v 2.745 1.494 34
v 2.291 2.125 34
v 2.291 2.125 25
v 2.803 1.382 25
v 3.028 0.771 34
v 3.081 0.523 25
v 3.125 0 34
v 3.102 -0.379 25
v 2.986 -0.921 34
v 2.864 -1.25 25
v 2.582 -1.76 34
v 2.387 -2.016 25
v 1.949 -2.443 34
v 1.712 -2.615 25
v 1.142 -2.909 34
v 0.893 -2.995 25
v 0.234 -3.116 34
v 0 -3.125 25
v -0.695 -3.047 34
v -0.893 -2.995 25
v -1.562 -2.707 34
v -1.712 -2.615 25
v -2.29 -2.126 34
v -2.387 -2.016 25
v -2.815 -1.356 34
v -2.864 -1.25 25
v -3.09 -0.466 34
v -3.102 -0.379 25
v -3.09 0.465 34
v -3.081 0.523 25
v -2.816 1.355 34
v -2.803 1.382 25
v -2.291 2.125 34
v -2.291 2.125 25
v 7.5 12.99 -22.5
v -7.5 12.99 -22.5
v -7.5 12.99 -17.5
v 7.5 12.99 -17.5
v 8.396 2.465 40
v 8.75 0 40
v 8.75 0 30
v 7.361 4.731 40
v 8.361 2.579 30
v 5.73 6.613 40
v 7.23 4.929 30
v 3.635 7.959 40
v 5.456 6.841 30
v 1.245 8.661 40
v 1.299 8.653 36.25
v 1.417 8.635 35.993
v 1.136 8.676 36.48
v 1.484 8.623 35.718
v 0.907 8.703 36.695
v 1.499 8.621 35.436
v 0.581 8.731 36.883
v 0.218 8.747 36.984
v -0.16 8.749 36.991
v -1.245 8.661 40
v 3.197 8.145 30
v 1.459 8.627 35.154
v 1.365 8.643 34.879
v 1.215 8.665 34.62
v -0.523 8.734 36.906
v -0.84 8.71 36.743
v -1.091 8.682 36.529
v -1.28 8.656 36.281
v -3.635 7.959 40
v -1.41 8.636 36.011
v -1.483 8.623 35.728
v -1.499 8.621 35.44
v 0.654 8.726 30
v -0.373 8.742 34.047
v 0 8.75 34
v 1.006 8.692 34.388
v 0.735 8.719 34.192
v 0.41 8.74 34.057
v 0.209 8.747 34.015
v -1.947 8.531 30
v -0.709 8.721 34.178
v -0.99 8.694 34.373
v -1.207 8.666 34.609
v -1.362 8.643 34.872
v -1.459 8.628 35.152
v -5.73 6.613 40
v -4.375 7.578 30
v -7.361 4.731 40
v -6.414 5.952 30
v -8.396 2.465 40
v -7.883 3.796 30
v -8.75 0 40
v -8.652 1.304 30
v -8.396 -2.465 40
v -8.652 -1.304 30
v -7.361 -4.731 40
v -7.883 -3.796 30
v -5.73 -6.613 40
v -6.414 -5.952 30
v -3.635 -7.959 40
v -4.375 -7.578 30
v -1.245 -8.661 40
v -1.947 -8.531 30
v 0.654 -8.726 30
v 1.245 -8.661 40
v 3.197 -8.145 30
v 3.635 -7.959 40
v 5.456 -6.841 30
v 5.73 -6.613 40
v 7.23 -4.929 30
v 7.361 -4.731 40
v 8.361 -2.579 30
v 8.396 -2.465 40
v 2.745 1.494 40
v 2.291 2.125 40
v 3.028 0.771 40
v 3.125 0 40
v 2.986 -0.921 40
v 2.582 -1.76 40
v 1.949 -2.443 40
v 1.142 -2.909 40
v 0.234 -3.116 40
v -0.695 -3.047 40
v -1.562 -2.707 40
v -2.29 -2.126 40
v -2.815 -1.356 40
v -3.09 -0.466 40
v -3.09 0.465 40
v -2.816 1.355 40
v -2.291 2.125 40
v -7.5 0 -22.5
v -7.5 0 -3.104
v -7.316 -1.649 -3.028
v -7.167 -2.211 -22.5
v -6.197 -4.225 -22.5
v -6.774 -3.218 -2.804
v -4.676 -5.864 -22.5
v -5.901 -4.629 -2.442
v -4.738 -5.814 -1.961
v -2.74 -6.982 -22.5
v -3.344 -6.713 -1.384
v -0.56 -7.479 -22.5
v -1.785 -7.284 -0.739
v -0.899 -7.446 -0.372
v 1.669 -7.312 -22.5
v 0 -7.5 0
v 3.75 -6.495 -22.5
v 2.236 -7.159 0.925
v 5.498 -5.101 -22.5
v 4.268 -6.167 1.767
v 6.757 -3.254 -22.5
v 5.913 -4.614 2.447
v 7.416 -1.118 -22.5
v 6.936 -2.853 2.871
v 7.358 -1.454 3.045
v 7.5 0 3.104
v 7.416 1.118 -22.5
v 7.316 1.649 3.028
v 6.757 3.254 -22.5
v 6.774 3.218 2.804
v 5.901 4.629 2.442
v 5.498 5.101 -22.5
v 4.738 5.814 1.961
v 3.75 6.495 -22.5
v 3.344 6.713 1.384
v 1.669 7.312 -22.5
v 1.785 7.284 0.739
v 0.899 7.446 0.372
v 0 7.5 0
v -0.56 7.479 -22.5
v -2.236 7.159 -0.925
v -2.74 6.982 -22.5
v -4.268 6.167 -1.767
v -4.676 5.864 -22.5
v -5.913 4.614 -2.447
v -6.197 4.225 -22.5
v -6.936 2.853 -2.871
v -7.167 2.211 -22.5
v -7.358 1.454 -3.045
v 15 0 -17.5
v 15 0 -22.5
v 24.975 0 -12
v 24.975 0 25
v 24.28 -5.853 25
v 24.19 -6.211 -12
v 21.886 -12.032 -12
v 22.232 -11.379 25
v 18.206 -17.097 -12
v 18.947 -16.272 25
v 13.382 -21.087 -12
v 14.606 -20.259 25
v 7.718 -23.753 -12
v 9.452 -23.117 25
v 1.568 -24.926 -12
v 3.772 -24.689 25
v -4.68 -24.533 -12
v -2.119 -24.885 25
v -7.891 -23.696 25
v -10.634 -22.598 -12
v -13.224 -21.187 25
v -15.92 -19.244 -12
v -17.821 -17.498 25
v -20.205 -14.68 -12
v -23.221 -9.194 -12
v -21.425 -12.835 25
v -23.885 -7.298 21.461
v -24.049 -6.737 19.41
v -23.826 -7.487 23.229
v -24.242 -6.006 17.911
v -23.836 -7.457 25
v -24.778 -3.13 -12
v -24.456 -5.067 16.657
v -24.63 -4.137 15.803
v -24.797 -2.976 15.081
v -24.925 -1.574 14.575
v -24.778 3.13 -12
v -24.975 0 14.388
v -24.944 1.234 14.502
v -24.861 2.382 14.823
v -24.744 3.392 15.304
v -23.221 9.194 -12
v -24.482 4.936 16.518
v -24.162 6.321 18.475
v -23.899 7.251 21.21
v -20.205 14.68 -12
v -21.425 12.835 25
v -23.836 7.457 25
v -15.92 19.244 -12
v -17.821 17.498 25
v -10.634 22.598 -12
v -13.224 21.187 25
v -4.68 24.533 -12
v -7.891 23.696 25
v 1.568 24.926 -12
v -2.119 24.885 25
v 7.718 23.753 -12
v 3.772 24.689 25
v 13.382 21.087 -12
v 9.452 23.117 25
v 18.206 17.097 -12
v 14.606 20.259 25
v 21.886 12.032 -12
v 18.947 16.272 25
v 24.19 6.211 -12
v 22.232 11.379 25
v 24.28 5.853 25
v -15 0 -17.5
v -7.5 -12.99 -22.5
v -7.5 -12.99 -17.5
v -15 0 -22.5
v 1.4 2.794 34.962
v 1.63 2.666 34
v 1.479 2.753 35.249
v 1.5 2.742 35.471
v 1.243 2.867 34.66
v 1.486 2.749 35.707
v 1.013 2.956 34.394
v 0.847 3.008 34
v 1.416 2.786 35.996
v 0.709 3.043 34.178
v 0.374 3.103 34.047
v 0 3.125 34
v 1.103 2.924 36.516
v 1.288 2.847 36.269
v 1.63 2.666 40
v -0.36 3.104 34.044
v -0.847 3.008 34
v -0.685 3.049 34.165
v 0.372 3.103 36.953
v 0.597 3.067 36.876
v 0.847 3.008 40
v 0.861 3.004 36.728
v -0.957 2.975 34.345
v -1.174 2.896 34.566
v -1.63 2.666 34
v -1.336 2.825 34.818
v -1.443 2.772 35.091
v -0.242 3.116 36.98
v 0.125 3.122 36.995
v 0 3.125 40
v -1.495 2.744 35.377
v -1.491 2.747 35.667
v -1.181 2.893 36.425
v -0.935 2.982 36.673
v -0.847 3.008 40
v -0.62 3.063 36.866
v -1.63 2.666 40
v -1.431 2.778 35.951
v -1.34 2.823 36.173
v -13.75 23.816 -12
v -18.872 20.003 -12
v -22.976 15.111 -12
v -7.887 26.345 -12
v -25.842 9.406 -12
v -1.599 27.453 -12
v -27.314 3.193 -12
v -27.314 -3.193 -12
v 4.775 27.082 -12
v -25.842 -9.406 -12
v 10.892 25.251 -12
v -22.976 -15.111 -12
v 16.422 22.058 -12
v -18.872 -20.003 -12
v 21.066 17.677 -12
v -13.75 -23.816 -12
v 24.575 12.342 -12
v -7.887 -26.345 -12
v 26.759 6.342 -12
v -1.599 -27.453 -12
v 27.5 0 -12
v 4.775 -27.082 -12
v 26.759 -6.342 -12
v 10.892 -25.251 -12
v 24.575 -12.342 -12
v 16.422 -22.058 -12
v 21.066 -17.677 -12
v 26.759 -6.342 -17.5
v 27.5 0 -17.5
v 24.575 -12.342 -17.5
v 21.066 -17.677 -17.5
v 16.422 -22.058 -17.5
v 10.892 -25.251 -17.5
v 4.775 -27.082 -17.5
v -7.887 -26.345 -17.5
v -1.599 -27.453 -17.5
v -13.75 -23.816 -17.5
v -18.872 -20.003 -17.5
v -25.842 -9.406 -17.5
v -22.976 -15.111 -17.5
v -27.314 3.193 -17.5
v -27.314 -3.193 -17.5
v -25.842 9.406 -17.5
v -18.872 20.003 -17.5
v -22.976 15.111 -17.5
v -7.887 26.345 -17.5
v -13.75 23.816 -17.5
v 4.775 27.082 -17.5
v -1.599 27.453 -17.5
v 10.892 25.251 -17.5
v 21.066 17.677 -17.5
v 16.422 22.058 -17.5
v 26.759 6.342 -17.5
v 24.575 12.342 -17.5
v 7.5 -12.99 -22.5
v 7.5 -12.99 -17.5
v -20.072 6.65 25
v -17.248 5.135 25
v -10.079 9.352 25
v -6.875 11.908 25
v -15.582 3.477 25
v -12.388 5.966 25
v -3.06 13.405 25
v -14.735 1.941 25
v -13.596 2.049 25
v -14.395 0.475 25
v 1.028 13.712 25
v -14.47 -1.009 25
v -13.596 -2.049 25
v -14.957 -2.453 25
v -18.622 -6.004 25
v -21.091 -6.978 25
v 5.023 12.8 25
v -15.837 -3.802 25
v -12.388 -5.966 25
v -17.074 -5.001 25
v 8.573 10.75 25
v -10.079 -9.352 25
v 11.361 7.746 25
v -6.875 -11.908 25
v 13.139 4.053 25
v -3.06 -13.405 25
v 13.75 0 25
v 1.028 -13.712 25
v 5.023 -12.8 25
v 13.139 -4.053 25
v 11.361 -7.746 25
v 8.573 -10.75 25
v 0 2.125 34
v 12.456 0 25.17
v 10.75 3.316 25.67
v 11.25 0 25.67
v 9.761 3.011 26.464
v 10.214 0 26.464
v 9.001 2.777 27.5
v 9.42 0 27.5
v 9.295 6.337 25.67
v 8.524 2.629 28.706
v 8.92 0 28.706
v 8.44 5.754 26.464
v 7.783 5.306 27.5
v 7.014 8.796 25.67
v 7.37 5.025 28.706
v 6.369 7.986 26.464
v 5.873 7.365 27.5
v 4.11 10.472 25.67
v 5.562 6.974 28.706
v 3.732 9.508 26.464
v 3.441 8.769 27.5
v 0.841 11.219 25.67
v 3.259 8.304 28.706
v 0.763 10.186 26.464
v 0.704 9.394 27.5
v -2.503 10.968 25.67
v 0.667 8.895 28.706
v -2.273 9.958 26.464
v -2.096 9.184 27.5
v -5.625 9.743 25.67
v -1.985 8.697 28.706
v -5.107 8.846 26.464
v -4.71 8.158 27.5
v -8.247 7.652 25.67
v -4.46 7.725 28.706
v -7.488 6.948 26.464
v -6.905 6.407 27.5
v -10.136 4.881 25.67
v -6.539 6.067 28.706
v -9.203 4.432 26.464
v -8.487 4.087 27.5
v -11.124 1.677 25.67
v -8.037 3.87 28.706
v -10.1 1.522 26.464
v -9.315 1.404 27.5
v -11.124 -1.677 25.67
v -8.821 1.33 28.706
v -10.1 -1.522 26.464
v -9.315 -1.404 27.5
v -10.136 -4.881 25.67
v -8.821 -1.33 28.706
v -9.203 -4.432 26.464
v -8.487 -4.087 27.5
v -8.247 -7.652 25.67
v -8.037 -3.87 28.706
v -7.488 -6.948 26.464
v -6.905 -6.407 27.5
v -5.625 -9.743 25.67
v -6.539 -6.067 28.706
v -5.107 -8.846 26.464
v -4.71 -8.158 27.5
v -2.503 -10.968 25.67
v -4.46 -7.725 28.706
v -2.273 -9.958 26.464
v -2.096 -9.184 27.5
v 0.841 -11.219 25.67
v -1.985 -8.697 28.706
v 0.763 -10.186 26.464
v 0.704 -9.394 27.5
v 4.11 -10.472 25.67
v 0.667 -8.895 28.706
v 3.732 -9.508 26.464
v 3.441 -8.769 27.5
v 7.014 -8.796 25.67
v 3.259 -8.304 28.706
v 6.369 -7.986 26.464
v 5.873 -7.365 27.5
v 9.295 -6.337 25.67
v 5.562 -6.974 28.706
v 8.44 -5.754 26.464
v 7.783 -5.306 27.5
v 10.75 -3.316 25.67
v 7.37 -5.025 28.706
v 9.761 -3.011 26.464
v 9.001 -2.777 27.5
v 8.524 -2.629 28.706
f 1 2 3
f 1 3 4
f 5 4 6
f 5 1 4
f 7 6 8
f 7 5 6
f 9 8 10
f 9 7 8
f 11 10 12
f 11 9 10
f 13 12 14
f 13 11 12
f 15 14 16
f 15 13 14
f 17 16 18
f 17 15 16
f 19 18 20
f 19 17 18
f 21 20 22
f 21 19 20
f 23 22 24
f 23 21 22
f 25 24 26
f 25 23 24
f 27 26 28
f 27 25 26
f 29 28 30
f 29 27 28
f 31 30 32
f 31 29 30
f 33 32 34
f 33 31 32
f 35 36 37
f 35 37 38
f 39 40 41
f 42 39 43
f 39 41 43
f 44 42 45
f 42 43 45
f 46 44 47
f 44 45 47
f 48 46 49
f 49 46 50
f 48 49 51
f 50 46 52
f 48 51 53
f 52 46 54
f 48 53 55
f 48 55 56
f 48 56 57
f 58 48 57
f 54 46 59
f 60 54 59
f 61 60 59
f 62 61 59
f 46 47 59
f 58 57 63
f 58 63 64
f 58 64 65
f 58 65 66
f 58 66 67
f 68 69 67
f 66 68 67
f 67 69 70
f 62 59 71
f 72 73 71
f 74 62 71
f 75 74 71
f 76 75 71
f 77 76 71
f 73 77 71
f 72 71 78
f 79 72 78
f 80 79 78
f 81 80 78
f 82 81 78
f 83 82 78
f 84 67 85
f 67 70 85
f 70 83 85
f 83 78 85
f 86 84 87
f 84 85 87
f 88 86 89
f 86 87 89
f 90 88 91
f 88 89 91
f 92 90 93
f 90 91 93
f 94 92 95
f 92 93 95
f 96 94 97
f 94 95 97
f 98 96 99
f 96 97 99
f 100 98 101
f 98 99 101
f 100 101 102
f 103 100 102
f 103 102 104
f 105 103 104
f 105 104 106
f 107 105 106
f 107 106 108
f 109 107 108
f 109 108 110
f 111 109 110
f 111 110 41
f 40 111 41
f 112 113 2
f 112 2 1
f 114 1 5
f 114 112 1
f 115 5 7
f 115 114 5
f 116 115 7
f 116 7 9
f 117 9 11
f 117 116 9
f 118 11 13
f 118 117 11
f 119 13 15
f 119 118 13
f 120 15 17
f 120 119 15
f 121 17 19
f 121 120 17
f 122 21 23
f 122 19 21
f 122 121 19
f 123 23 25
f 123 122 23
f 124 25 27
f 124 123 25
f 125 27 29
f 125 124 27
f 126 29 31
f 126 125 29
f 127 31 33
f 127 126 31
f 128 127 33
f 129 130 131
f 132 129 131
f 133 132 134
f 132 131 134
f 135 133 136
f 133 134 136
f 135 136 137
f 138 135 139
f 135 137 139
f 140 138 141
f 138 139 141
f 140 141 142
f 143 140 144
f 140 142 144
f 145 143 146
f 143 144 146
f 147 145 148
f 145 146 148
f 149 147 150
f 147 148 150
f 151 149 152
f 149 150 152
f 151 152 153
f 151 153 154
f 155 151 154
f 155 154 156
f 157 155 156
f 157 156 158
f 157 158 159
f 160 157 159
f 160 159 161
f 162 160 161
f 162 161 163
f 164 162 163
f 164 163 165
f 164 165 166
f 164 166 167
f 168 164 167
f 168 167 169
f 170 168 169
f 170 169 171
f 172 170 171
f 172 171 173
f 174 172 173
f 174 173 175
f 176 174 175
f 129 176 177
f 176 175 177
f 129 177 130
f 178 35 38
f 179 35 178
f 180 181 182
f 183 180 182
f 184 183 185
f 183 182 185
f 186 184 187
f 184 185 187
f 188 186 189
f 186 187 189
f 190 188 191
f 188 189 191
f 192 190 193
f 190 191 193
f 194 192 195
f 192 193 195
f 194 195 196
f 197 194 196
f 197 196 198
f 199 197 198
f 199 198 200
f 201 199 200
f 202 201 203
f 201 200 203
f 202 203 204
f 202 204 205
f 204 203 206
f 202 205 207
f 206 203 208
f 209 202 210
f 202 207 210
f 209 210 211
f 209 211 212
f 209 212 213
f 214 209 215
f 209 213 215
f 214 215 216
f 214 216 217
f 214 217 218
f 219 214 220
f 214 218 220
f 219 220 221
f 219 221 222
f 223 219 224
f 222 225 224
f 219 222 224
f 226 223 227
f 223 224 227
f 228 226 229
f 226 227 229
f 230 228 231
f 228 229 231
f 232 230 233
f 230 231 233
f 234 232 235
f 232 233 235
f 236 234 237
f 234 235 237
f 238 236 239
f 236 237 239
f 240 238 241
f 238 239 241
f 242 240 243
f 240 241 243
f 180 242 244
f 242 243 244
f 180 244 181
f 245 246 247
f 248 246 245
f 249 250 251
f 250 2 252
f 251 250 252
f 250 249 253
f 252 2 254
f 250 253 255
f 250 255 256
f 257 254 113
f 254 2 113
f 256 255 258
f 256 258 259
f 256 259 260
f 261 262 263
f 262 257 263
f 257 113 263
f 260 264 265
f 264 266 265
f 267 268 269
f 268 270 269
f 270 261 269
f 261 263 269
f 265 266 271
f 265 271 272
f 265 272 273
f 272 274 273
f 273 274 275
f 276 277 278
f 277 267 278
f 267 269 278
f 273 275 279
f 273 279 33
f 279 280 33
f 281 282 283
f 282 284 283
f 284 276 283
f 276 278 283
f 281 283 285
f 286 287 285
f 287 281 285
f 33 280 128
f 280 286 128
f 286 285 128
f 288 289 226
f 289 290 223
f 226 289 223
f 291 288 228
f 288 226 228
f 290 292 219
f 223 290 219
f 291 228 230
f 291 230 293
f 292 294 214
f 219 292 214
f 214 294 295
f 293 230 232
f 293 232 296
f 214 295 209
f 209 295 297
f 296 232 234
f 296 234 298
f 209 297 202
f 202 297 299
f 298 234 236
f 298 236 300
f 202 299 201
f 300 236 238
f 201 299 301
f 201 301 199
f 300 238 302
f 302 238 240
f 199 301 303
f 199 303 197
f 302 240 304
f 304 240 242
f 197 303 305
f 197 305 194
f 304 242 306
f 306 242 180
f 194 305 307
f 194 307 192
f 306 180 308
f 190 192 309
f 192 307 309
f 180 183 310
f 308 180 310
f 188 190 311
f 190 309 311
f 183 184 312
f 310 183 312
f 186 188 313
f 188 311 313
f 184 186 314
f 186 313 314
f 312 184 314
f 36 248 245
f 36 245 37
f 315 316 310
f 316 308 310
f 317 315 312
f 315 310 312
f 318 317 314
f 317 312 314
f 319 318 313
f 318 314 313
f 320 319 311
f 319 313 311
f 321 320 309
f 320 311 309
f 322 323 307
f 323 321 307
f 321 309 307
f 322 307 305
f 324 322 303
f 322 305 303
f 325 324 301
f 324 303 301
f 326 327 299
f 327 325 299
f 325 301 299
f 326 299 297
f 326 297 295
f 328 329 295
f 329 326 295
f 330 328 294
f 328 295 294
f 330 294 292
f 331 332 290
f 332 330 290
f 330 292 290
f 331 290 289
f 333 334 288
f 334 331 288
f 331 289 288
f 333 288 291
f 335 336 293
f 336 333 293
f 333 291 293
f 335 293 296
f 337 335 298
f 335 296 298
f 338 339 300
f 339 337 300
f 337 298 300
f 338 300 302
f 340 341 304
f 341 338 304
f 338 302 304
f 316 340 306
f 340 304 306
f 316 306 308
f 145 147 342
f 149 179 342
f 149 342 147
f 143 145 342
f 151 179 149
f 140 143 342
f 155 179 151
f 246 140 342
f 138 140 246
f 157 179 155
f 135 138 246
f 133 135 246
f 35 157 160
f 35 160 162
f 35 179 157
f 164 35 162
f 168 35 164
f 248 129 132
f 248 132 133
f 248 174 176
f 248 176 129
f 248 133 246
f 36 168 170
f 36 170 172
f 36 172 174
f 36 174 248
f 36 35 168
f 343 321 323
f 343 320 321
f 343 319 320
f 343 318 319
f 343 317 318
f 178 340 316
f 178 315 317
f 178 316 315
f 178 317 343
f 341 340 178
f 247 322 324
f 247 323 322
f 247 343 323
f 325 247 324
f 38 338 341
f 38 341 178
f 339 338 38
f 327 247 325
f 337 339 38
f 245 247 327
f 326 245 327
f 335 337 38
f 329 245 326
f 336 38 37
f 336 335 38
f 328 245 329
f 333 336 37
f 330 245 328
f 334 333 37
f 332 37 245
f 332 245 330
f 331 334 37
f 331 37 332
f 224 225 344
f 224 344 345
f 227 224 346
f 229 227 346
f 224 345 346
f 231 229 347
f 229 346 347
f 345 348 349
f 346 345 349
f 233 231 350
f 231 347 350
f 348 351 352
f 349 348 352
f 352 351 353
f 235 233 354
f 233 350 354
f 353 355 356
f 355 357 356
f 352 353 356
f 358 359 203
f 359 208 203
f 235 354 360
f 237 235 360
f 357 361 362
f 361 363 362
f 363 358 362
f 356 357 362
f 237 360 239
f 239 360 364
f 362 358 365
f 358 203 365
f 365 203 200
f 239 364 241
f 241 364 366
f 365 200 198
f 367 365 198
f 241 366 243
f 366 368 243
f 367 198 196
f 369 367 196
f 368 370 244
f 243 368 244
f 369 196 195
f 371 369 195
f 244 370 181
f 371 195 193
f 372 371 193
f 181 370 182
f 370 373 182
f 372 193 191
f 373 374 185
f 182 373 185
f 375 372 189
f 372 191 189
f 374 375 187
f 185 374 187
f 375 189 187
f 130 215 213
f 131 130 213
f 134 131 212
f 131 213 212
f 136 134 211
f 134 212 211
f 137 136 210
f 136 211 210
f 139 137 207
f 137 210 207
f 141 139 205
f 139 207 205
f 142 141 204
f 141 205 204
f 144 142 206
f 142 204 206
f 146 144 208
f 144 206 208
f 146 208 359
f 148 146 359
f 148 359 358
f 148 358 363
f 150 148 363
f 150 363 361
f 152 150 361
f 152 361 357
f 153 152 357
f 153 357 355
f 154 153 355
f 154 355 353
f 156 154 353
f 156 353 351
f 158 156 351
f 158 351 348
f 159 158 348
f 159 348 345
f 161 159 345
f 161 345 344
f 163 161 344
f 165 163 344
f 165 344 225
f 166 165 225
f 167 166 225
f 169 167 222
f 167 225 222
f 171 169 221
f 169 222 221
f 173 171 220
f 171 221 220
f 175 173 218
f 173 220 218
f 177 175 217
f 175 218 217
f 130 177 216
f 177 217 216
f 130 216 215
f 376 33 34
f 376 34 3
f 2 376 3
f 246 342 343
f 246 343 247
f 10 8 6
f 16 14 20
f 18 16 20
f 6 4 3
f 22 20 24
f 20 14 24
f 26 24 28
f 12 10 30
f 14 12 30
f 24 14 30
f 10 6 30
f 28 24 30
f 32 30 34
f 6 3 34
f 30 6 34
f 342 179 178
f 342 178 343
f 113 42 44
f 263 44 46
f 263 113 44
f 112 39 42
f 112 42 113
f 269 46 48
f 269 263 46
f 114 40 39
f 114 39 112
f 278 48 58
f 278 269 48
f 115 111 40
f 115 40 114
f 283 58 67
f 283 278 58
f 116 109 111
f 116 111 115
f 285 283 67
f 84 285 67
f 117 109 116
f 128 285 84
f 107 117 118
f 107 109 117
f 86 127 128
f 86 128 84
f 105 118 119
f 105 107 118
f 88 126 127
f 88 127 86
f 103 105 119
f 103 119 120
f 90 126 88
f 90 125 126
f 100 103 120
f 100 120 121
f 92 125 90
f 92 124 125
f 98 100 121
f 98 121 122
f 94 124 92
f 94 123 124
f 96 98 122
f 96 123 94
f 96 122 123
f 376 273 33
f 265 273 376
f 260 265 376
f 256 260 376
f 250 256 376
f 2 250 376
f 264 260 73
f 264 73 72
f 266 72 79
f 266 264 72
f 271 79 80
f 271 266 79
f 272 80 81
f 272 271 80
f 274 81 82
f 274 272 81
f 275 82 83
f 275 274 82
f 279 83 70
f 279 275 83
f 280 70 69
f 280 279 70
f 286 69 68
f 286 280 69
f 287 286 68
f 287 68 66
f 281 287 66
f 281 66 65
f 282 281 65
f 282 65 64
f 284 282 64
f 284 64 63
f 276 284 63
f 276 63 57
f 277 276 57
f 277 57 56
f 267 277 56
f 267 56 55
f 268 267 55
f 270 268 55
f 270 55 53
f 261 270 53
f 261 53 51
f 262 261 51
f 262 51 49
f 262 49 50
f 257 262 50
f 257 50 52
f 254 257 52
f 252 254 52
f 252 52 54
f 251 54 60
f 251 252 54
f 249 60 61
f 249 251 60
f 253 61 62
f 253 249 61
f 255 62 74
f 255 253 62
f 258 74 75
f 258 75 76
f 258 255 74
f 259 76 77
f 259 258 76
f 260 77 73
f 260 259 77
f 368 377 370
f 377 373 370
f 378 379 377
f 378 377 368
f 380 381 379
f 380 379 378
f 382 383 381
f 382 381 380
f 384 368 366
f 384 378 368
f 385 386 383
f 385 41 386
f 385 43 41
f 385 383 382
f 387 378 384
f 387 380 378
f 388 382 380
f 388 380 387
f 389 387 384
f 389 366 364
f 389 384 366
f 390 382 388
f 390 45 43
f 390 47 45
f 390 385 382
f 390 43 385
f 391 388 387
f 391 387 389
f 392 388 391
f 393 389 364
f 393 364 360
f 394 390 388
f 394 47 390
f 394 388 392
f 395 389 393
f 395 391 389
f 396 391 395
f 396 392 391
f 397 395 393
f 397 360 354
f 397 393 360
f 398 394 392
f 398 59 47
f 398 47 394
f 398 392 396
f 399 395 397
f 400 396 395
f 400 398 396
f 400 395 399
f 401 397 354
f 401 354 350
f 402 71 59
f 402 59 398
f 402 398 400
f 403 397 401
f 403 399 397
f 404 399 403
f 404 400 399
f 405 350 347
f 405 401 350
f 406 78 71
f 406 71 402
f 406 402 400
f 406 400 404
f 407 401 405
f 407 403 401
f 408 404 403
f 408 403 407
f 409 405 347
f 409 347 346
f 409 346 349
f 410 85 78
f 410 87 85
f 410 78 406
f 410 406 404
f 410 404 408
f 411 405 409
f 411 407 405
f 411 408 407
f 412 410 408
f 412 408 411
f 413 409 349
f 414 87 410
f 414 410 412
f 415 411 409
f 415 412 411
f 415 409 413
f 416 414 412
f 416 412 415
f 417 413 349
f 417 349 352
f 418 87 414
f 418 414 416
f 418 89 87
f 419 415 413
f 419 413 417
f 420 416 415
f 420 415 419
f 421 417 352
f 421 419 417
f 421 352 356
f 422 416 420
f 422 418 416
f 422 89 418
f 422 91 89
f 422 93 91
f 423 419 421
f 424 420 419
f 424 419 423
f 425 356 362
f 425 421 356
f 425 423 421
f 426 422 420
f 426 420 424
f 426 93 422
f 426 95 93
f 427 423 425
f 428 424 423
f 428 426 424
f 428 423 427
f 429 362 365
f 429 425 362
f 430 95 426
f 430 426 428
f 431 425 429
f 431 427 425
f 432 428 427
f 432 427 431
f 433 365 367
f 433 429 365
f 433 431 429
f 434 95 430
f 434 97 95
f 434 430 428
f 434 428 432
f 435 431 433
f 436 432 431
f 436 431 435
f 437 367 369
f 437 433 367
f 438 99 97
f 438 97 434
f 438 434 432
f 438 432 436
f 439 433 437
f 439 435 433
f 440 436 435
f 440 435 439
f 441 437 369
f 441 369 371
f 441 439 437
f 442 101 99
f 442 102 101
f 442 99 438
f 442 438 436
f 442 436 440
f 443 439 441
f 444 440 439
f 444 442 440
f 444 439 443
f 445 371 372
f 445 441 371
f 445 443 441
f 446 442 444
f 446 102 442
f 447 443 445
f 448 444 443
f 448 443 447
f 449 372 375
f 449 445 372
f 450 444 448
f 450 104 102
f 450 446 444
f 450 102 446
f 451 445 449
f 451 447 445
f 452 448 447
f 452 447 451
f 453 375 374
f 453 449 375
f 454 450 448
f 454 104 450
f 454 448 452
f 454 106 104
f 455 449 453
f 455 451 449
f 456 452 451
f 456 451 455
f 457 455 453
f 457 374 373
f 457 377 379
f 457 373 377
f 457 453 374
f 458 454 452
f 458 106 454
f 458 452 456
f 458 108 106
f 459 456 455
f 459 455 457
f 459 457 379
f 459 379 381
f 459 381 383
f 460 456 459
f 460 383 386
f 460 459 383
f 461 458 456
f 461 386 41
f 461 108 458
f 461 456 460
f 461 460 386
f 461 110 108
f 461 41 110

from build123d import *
from build123d.topology import SkipClean

# Parameters (mm, degrees)
IZIM3_OUTSIDE_W             = 75.494
IZIM3_OUTSIDE_H             = 75.494
KES_EKSTR_ZYON1_DEPTH       = 7.5
IZIM4_R                     = 8.75
Y_KSEKLIK_EKSTR_ZYON1_DEPTH = 20
RADYUS1_R                   = 5
KES_EKSTR_ZYON2_DEPTH       = 20
IZIM6_R                     = 1.5
KES_EKSTR_ZYON3_DEPTH       = 60.476886267
IZIM7_R                     = 3.125
KES_EKSTR_ZYON4_DEPTH       = 11
KES_EKSTR_ZYON5_START       = -5
IZIM8_R                     = 8.75
KES_EKSTR_ZYON5_DEPTH       = 5
KES_EKSTR_ZYON6_DEPTH       = 2.5
IZIM11_R                    = 7.5


with BuildPart() as part:
    # Çizim1 → Döndür1 (revolve)
    with BuildSketch(Plane(origin=(0, 0, 0), x_dir=(1, 0, 0), z_dir=(0, 1, 0)), mode=Mode.PRIVATE) as d_nd_r1_sk:
        Polygon((-27.5, 25), (-27.5, 12), (-24.975, 12), (-24.975, -25), (0, -25), (0, 25), align=None)
    revolve(d_nd_r1_sk.sketch.rotate(Axis((0, 0, 25), (0, 0, -1)), 180), axis=Axis((0, 0, 25), (0, 0, -1)))

    # Çizim3 outside → Kes-Ekstrüzyon1 (cut)
    with BuildSketch(Plane(origin=(0, 0, -25), x_dir=(-1, 0, 0), z_dir=(0, 0, -1))):
        Rectangle(IZIM3_OUTSIDE_W, IZIM3_OUTSIDE_H)
        Polygon((15, 0), (7.5, 12.990381057), (-7.5, 12.990381057), (-15, 0), (-7.5, -12.990381057), (7.5, -12.990381057), align=None, mode=Mode.SUBTRACT)
    extrude(amount=-KES_EKSTR_ZYON1_DEPTH, mode=Mode.SUBTRACT)

    # Çizim4 → Yükseklik-Ekstrüzyon1 (add)
    with BuildSketch(Plane.XY.offset(25)):
        Circle(IZIM4_R)
    extrude(amount=Y_KSEKLIK_EKSTR_ZYON1_DEPTH)

    # Radyus1
    radyus1_edges = [part.edges().sort_by_distance(p)[0] for p in [
        (-8.75, 0, 25),
    ]]
    fillet(radyus1_edges, radius=RADYUS1_R)

    # Çizim5 → Kes-Ekstrüzyon2 (cut)
    with BuildSketch(Plane.XY.offset(45)):
        with BuildLine():
            Line((-2.291287847, 2.125), (2.291287847, 2.125))
            ThreePointArc((2.291287847, 2.125), (0, -3.125), (-2.291287847, 2.125))
        make_face()
    extrude(amount=-KES_EKSTR_ZYON2_DEPTH, mode=Mode.SUBTRACT)

    # Çizim6 → Kes-Ekstrüzyon3 (cut, through all)
    with BuildSketch(Plane(origin=(0, 0, 0), x_dir=(1, 0, 0), z_dir=(0, 1, 0))):
        with Locations(Location((0, -35.5, 0), (0, 0, 90))):
            Circle(IZIM6_R)
    extrude(amount=KES_EKSTR_ZYON3_DEPTH, mode=Mode.SUBTRACT)

    # Çizim7 → Kes-Ekstrüzyon4 (cut)
    with SkipClean():  # the faces are left unmerged after this step: merging them gives an invalid solid
        with BuildSketch(Plane.XY.offset(45)):
            Circle(IZIM7_R)
        extrude(amount=-KES_EKSTR_ZYON4_DEPTH, mode=Mode.SUBTRACT)

    # Çizim8 → Kes-Ekstrüzyon5 (cut)
    with SkipClean():  # the faces are left unmerged after this step: merging them gives an invalid solid
        with BuildSketch(Plane.XY.offset(45).offset(KES_EKSTR_ZYON5_START)):
            with Locations(Location((0, 0, 0), (0, 0, 180))):
                Circle(IZIM8_R)
        extrude(amount=KES_EKSTR_ZYON5_DEPTH, mode=Mode.SUBTRACT)

    # Çizim9 → Kes-Ekstrüzyon6 (cut)
    with SkipClean():  # the faces are left unmerged after this step: merging them gives an invalid solid
        with BuildSketch(Plane(origin=(0, 0, -25), x_dir=(-1, 0, 0), z_dir=(0, 0, -1))):
            Polygon((7.5, -12.990381057), (15, 0), (7.5, 12.990381057), (-7.5, 12.990381057), (-15, 0), (-7.5, -12.990381057), align=None)
        extrude(amount=-KES_EKSTR_ZYON6_DEPTH, mode=Mode.SUBTRACT)

    # Kes-Süpür1: sweep along a path in Çizim10
    with SkipClean():  # the faces are left unmerged after this step: merging them gives an invalid solid
        with BuildLine(Plane(origin=(0, 0, 0), x_dir=(1, 0, 0), z_dir=(0, 1, 0))) as kes_s_p_r1_path:
            Line((0, 22.5), (0, 0))
            Line((0, 0), (-24.975, -25))
        # Çizim11 → Kes-Süpür1 (sweep, cut)
        with BuildSketch(Plane(origin=(0, 0, -22.5), x_dir=(-1, 0, 0), z_dir=(0, 0, -1))):
            Circle(IZIM11_R)
        sweep(path=kes_s_p_r1_path.line, transition=Transition.RIGHT, mode=Mode.SUBTRACT)


solid = part.part
